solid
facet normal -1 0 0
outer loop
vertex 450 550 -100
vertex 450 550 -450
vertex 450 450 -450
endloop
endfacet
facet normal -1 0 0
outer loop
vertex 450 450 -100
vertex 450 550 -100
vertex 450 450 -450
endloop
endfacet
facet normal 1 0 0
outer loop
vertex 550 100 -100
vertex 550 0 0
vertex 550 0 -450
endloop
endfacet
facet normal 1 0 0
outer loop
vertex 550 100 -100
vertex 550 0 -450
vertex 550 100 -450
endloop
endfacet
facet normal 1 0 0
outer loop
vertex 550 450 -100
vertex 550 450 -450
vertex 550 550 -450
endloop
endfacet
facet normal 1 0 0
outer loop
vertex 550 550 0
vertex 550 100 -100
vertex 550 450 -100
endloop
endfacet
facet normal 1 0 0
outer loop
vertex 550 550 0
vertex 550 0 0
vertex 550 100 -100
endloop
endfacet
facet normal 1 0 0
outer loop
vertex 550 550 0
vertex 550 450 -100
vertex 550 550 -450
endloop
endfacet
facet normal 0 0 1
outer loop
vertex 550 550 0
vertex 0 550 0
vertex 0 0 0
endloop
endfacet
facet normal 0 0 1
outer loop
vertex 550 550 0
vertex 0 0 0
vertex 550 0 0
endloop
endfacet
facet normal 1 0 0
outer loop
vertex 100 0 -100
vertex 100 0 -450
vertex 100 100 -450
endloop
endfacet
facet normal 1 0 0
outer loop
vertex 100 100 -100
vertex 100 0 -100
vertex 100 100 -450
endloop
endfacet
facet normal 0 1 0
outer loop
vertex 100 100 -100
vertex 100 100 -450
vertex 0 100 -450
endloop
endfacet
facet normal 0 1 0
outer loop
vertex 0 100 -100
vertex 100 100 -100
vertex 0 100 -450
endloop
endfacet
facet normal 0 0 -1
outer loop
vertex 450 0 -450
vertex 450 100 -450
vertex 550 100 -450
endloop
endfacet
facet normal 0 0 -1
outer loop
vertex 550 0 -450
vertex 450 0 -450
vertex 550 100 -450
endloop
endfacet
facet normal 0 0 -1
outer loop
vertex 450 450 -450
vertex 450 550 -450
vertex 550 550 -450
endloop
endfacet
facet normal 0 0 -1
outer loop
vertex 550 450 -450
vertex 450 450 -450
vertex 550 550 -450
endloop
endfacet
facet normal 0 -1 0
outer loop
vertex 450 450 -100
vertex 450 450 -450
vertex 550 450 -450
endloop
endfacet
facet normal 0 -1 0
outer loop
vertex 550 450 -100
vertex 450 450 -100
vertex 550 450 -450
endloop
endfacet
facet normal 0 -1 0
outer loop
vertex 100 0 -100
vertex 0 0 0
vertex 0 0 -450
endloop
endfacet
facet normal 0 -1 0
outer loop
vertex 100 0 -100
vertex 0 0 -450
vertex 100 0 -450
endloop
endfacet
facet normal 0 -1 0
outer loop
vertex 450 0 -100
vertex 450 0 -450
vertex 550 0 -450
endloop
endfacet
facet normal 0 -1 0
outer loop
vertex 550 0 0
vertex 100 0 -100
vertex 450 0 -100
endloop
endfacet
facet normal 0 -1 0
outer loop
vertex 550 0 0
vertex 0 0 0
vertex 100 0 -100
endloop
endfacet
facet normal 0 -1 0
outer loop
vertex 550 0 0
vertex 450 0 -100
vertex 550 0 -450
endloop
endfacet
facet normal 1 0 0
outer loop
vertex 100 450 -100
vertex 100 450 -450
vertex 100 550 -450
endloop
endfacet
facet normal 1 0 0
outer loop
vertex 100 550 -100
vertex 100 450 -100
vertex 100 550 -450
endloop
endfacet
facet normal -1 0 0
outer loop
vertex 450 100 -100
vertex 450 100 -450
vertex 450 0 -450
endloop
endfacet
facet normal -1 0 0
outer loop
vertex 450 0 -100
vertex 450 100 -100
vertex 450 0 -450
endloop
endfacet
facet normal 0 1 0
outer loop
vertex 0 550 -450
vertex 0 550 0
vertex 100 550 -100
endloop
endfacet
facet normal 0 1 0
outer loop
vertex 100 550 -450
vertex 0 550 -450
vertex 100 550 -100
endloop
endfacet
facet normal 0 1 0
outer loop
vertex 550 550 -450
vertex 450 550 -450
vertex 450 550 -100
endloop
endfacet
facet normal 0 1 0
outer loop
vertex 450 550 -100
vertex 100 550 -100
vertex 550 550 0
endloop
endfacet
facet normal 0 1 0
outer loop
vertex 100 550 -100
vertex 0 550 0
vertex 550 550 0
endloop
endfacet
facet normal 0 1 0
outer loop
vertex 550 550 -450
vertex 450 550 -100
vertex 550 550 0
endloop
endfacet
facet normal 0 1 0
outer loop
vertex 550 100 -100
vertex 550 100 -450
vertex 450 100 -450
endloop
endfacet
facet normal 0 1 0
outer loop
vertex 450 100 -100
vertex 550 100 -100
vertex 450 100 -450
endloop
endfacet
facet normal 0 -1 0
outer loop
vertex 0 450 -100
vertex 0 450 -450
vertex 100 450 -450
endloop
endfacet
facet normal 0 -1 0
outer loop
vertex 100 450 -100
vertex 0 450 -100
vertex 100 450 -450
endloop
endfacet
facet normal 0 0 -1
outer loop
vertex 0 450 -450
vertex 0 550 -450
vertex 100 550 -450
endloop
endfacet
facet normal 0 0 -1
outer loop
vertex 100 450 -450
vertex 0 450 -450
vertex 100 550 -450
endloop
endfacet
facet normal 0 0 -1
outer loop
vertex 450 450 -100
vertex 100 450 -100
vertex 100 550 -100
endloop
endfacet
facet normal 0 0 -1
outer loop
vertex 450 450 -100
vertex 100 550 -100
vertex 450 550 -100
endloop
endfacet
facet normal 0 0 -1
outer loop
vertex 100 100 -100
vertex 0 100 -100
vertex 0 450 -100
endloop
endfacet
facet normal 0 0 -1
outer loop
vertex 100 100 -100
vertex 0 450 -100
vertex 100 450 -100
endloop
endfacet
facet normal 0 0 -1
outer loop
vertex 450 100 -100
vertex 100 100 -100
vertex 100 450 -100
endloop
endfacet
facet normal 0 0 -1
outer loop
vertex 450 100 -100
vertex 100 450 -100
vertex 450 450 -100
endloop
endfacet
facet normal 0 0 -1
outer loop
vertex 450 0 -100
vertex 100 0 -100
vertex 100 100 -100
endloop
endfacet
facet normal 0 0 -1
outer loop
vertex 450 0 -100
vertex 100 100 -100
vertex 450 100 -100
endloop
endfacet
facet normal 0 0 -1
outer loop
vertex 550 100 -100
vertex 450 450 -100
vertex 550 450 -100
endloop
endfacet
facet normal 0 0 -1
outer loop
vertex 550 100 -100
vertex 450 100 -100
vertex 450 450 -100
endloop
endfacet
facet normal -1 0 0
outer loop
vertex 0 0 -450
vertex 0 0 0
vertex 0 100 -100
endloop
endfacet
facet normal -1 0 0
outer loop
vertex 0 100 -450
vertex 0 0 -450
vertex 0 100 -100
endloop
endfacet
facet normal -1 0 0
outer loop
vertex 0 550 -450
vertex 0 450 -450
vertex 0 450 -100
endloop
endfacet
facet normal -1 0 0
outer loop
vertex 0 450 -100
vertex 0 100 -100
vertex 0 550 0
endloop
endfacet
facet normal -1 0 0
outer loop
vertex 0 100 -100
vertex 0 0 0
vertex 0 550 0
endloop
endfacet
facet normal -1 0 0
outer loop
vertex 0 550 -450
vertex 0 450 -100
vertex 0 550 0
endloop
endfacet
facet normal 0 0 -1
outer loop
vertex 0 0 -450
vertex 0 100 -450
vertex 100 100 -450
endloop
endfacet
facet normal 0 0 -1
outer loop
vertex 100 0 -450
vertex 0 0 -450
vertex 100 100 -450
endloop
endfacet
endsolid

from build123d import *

# Parameters (mm, degrees)
F0_W     = 550
F0_H     = 550
F1_DEPTH = 450
F3_DEPTH = 350


with BuildPart() as f1:
    # F0 (on Top) → F1 (new body)
    with BuildSketch(Plane.XY):
        with Locations((275, 275)):
            Rectangle(F0_W, F0_H)
    extrude(amount=-F1_DEPTH)

    # F2 (on face) → F3 (cut)
    with BuildSketch(Plane(origin=(0, 0, -450), x_dir=(1, 0, 0), z_dir=(0, 0, -1))):
        Polygon((450, 0), (100, 0), (100, -100), (0, -100), (0, -450), (100, -450), (100, -550), (450, -550), (450, -450), (550, -450), (550, -100), (450, -100), align=None)
    extrude(amount=-F3_DEPTH, mode=Mode.SUBTRACT)


solid = f1.part
